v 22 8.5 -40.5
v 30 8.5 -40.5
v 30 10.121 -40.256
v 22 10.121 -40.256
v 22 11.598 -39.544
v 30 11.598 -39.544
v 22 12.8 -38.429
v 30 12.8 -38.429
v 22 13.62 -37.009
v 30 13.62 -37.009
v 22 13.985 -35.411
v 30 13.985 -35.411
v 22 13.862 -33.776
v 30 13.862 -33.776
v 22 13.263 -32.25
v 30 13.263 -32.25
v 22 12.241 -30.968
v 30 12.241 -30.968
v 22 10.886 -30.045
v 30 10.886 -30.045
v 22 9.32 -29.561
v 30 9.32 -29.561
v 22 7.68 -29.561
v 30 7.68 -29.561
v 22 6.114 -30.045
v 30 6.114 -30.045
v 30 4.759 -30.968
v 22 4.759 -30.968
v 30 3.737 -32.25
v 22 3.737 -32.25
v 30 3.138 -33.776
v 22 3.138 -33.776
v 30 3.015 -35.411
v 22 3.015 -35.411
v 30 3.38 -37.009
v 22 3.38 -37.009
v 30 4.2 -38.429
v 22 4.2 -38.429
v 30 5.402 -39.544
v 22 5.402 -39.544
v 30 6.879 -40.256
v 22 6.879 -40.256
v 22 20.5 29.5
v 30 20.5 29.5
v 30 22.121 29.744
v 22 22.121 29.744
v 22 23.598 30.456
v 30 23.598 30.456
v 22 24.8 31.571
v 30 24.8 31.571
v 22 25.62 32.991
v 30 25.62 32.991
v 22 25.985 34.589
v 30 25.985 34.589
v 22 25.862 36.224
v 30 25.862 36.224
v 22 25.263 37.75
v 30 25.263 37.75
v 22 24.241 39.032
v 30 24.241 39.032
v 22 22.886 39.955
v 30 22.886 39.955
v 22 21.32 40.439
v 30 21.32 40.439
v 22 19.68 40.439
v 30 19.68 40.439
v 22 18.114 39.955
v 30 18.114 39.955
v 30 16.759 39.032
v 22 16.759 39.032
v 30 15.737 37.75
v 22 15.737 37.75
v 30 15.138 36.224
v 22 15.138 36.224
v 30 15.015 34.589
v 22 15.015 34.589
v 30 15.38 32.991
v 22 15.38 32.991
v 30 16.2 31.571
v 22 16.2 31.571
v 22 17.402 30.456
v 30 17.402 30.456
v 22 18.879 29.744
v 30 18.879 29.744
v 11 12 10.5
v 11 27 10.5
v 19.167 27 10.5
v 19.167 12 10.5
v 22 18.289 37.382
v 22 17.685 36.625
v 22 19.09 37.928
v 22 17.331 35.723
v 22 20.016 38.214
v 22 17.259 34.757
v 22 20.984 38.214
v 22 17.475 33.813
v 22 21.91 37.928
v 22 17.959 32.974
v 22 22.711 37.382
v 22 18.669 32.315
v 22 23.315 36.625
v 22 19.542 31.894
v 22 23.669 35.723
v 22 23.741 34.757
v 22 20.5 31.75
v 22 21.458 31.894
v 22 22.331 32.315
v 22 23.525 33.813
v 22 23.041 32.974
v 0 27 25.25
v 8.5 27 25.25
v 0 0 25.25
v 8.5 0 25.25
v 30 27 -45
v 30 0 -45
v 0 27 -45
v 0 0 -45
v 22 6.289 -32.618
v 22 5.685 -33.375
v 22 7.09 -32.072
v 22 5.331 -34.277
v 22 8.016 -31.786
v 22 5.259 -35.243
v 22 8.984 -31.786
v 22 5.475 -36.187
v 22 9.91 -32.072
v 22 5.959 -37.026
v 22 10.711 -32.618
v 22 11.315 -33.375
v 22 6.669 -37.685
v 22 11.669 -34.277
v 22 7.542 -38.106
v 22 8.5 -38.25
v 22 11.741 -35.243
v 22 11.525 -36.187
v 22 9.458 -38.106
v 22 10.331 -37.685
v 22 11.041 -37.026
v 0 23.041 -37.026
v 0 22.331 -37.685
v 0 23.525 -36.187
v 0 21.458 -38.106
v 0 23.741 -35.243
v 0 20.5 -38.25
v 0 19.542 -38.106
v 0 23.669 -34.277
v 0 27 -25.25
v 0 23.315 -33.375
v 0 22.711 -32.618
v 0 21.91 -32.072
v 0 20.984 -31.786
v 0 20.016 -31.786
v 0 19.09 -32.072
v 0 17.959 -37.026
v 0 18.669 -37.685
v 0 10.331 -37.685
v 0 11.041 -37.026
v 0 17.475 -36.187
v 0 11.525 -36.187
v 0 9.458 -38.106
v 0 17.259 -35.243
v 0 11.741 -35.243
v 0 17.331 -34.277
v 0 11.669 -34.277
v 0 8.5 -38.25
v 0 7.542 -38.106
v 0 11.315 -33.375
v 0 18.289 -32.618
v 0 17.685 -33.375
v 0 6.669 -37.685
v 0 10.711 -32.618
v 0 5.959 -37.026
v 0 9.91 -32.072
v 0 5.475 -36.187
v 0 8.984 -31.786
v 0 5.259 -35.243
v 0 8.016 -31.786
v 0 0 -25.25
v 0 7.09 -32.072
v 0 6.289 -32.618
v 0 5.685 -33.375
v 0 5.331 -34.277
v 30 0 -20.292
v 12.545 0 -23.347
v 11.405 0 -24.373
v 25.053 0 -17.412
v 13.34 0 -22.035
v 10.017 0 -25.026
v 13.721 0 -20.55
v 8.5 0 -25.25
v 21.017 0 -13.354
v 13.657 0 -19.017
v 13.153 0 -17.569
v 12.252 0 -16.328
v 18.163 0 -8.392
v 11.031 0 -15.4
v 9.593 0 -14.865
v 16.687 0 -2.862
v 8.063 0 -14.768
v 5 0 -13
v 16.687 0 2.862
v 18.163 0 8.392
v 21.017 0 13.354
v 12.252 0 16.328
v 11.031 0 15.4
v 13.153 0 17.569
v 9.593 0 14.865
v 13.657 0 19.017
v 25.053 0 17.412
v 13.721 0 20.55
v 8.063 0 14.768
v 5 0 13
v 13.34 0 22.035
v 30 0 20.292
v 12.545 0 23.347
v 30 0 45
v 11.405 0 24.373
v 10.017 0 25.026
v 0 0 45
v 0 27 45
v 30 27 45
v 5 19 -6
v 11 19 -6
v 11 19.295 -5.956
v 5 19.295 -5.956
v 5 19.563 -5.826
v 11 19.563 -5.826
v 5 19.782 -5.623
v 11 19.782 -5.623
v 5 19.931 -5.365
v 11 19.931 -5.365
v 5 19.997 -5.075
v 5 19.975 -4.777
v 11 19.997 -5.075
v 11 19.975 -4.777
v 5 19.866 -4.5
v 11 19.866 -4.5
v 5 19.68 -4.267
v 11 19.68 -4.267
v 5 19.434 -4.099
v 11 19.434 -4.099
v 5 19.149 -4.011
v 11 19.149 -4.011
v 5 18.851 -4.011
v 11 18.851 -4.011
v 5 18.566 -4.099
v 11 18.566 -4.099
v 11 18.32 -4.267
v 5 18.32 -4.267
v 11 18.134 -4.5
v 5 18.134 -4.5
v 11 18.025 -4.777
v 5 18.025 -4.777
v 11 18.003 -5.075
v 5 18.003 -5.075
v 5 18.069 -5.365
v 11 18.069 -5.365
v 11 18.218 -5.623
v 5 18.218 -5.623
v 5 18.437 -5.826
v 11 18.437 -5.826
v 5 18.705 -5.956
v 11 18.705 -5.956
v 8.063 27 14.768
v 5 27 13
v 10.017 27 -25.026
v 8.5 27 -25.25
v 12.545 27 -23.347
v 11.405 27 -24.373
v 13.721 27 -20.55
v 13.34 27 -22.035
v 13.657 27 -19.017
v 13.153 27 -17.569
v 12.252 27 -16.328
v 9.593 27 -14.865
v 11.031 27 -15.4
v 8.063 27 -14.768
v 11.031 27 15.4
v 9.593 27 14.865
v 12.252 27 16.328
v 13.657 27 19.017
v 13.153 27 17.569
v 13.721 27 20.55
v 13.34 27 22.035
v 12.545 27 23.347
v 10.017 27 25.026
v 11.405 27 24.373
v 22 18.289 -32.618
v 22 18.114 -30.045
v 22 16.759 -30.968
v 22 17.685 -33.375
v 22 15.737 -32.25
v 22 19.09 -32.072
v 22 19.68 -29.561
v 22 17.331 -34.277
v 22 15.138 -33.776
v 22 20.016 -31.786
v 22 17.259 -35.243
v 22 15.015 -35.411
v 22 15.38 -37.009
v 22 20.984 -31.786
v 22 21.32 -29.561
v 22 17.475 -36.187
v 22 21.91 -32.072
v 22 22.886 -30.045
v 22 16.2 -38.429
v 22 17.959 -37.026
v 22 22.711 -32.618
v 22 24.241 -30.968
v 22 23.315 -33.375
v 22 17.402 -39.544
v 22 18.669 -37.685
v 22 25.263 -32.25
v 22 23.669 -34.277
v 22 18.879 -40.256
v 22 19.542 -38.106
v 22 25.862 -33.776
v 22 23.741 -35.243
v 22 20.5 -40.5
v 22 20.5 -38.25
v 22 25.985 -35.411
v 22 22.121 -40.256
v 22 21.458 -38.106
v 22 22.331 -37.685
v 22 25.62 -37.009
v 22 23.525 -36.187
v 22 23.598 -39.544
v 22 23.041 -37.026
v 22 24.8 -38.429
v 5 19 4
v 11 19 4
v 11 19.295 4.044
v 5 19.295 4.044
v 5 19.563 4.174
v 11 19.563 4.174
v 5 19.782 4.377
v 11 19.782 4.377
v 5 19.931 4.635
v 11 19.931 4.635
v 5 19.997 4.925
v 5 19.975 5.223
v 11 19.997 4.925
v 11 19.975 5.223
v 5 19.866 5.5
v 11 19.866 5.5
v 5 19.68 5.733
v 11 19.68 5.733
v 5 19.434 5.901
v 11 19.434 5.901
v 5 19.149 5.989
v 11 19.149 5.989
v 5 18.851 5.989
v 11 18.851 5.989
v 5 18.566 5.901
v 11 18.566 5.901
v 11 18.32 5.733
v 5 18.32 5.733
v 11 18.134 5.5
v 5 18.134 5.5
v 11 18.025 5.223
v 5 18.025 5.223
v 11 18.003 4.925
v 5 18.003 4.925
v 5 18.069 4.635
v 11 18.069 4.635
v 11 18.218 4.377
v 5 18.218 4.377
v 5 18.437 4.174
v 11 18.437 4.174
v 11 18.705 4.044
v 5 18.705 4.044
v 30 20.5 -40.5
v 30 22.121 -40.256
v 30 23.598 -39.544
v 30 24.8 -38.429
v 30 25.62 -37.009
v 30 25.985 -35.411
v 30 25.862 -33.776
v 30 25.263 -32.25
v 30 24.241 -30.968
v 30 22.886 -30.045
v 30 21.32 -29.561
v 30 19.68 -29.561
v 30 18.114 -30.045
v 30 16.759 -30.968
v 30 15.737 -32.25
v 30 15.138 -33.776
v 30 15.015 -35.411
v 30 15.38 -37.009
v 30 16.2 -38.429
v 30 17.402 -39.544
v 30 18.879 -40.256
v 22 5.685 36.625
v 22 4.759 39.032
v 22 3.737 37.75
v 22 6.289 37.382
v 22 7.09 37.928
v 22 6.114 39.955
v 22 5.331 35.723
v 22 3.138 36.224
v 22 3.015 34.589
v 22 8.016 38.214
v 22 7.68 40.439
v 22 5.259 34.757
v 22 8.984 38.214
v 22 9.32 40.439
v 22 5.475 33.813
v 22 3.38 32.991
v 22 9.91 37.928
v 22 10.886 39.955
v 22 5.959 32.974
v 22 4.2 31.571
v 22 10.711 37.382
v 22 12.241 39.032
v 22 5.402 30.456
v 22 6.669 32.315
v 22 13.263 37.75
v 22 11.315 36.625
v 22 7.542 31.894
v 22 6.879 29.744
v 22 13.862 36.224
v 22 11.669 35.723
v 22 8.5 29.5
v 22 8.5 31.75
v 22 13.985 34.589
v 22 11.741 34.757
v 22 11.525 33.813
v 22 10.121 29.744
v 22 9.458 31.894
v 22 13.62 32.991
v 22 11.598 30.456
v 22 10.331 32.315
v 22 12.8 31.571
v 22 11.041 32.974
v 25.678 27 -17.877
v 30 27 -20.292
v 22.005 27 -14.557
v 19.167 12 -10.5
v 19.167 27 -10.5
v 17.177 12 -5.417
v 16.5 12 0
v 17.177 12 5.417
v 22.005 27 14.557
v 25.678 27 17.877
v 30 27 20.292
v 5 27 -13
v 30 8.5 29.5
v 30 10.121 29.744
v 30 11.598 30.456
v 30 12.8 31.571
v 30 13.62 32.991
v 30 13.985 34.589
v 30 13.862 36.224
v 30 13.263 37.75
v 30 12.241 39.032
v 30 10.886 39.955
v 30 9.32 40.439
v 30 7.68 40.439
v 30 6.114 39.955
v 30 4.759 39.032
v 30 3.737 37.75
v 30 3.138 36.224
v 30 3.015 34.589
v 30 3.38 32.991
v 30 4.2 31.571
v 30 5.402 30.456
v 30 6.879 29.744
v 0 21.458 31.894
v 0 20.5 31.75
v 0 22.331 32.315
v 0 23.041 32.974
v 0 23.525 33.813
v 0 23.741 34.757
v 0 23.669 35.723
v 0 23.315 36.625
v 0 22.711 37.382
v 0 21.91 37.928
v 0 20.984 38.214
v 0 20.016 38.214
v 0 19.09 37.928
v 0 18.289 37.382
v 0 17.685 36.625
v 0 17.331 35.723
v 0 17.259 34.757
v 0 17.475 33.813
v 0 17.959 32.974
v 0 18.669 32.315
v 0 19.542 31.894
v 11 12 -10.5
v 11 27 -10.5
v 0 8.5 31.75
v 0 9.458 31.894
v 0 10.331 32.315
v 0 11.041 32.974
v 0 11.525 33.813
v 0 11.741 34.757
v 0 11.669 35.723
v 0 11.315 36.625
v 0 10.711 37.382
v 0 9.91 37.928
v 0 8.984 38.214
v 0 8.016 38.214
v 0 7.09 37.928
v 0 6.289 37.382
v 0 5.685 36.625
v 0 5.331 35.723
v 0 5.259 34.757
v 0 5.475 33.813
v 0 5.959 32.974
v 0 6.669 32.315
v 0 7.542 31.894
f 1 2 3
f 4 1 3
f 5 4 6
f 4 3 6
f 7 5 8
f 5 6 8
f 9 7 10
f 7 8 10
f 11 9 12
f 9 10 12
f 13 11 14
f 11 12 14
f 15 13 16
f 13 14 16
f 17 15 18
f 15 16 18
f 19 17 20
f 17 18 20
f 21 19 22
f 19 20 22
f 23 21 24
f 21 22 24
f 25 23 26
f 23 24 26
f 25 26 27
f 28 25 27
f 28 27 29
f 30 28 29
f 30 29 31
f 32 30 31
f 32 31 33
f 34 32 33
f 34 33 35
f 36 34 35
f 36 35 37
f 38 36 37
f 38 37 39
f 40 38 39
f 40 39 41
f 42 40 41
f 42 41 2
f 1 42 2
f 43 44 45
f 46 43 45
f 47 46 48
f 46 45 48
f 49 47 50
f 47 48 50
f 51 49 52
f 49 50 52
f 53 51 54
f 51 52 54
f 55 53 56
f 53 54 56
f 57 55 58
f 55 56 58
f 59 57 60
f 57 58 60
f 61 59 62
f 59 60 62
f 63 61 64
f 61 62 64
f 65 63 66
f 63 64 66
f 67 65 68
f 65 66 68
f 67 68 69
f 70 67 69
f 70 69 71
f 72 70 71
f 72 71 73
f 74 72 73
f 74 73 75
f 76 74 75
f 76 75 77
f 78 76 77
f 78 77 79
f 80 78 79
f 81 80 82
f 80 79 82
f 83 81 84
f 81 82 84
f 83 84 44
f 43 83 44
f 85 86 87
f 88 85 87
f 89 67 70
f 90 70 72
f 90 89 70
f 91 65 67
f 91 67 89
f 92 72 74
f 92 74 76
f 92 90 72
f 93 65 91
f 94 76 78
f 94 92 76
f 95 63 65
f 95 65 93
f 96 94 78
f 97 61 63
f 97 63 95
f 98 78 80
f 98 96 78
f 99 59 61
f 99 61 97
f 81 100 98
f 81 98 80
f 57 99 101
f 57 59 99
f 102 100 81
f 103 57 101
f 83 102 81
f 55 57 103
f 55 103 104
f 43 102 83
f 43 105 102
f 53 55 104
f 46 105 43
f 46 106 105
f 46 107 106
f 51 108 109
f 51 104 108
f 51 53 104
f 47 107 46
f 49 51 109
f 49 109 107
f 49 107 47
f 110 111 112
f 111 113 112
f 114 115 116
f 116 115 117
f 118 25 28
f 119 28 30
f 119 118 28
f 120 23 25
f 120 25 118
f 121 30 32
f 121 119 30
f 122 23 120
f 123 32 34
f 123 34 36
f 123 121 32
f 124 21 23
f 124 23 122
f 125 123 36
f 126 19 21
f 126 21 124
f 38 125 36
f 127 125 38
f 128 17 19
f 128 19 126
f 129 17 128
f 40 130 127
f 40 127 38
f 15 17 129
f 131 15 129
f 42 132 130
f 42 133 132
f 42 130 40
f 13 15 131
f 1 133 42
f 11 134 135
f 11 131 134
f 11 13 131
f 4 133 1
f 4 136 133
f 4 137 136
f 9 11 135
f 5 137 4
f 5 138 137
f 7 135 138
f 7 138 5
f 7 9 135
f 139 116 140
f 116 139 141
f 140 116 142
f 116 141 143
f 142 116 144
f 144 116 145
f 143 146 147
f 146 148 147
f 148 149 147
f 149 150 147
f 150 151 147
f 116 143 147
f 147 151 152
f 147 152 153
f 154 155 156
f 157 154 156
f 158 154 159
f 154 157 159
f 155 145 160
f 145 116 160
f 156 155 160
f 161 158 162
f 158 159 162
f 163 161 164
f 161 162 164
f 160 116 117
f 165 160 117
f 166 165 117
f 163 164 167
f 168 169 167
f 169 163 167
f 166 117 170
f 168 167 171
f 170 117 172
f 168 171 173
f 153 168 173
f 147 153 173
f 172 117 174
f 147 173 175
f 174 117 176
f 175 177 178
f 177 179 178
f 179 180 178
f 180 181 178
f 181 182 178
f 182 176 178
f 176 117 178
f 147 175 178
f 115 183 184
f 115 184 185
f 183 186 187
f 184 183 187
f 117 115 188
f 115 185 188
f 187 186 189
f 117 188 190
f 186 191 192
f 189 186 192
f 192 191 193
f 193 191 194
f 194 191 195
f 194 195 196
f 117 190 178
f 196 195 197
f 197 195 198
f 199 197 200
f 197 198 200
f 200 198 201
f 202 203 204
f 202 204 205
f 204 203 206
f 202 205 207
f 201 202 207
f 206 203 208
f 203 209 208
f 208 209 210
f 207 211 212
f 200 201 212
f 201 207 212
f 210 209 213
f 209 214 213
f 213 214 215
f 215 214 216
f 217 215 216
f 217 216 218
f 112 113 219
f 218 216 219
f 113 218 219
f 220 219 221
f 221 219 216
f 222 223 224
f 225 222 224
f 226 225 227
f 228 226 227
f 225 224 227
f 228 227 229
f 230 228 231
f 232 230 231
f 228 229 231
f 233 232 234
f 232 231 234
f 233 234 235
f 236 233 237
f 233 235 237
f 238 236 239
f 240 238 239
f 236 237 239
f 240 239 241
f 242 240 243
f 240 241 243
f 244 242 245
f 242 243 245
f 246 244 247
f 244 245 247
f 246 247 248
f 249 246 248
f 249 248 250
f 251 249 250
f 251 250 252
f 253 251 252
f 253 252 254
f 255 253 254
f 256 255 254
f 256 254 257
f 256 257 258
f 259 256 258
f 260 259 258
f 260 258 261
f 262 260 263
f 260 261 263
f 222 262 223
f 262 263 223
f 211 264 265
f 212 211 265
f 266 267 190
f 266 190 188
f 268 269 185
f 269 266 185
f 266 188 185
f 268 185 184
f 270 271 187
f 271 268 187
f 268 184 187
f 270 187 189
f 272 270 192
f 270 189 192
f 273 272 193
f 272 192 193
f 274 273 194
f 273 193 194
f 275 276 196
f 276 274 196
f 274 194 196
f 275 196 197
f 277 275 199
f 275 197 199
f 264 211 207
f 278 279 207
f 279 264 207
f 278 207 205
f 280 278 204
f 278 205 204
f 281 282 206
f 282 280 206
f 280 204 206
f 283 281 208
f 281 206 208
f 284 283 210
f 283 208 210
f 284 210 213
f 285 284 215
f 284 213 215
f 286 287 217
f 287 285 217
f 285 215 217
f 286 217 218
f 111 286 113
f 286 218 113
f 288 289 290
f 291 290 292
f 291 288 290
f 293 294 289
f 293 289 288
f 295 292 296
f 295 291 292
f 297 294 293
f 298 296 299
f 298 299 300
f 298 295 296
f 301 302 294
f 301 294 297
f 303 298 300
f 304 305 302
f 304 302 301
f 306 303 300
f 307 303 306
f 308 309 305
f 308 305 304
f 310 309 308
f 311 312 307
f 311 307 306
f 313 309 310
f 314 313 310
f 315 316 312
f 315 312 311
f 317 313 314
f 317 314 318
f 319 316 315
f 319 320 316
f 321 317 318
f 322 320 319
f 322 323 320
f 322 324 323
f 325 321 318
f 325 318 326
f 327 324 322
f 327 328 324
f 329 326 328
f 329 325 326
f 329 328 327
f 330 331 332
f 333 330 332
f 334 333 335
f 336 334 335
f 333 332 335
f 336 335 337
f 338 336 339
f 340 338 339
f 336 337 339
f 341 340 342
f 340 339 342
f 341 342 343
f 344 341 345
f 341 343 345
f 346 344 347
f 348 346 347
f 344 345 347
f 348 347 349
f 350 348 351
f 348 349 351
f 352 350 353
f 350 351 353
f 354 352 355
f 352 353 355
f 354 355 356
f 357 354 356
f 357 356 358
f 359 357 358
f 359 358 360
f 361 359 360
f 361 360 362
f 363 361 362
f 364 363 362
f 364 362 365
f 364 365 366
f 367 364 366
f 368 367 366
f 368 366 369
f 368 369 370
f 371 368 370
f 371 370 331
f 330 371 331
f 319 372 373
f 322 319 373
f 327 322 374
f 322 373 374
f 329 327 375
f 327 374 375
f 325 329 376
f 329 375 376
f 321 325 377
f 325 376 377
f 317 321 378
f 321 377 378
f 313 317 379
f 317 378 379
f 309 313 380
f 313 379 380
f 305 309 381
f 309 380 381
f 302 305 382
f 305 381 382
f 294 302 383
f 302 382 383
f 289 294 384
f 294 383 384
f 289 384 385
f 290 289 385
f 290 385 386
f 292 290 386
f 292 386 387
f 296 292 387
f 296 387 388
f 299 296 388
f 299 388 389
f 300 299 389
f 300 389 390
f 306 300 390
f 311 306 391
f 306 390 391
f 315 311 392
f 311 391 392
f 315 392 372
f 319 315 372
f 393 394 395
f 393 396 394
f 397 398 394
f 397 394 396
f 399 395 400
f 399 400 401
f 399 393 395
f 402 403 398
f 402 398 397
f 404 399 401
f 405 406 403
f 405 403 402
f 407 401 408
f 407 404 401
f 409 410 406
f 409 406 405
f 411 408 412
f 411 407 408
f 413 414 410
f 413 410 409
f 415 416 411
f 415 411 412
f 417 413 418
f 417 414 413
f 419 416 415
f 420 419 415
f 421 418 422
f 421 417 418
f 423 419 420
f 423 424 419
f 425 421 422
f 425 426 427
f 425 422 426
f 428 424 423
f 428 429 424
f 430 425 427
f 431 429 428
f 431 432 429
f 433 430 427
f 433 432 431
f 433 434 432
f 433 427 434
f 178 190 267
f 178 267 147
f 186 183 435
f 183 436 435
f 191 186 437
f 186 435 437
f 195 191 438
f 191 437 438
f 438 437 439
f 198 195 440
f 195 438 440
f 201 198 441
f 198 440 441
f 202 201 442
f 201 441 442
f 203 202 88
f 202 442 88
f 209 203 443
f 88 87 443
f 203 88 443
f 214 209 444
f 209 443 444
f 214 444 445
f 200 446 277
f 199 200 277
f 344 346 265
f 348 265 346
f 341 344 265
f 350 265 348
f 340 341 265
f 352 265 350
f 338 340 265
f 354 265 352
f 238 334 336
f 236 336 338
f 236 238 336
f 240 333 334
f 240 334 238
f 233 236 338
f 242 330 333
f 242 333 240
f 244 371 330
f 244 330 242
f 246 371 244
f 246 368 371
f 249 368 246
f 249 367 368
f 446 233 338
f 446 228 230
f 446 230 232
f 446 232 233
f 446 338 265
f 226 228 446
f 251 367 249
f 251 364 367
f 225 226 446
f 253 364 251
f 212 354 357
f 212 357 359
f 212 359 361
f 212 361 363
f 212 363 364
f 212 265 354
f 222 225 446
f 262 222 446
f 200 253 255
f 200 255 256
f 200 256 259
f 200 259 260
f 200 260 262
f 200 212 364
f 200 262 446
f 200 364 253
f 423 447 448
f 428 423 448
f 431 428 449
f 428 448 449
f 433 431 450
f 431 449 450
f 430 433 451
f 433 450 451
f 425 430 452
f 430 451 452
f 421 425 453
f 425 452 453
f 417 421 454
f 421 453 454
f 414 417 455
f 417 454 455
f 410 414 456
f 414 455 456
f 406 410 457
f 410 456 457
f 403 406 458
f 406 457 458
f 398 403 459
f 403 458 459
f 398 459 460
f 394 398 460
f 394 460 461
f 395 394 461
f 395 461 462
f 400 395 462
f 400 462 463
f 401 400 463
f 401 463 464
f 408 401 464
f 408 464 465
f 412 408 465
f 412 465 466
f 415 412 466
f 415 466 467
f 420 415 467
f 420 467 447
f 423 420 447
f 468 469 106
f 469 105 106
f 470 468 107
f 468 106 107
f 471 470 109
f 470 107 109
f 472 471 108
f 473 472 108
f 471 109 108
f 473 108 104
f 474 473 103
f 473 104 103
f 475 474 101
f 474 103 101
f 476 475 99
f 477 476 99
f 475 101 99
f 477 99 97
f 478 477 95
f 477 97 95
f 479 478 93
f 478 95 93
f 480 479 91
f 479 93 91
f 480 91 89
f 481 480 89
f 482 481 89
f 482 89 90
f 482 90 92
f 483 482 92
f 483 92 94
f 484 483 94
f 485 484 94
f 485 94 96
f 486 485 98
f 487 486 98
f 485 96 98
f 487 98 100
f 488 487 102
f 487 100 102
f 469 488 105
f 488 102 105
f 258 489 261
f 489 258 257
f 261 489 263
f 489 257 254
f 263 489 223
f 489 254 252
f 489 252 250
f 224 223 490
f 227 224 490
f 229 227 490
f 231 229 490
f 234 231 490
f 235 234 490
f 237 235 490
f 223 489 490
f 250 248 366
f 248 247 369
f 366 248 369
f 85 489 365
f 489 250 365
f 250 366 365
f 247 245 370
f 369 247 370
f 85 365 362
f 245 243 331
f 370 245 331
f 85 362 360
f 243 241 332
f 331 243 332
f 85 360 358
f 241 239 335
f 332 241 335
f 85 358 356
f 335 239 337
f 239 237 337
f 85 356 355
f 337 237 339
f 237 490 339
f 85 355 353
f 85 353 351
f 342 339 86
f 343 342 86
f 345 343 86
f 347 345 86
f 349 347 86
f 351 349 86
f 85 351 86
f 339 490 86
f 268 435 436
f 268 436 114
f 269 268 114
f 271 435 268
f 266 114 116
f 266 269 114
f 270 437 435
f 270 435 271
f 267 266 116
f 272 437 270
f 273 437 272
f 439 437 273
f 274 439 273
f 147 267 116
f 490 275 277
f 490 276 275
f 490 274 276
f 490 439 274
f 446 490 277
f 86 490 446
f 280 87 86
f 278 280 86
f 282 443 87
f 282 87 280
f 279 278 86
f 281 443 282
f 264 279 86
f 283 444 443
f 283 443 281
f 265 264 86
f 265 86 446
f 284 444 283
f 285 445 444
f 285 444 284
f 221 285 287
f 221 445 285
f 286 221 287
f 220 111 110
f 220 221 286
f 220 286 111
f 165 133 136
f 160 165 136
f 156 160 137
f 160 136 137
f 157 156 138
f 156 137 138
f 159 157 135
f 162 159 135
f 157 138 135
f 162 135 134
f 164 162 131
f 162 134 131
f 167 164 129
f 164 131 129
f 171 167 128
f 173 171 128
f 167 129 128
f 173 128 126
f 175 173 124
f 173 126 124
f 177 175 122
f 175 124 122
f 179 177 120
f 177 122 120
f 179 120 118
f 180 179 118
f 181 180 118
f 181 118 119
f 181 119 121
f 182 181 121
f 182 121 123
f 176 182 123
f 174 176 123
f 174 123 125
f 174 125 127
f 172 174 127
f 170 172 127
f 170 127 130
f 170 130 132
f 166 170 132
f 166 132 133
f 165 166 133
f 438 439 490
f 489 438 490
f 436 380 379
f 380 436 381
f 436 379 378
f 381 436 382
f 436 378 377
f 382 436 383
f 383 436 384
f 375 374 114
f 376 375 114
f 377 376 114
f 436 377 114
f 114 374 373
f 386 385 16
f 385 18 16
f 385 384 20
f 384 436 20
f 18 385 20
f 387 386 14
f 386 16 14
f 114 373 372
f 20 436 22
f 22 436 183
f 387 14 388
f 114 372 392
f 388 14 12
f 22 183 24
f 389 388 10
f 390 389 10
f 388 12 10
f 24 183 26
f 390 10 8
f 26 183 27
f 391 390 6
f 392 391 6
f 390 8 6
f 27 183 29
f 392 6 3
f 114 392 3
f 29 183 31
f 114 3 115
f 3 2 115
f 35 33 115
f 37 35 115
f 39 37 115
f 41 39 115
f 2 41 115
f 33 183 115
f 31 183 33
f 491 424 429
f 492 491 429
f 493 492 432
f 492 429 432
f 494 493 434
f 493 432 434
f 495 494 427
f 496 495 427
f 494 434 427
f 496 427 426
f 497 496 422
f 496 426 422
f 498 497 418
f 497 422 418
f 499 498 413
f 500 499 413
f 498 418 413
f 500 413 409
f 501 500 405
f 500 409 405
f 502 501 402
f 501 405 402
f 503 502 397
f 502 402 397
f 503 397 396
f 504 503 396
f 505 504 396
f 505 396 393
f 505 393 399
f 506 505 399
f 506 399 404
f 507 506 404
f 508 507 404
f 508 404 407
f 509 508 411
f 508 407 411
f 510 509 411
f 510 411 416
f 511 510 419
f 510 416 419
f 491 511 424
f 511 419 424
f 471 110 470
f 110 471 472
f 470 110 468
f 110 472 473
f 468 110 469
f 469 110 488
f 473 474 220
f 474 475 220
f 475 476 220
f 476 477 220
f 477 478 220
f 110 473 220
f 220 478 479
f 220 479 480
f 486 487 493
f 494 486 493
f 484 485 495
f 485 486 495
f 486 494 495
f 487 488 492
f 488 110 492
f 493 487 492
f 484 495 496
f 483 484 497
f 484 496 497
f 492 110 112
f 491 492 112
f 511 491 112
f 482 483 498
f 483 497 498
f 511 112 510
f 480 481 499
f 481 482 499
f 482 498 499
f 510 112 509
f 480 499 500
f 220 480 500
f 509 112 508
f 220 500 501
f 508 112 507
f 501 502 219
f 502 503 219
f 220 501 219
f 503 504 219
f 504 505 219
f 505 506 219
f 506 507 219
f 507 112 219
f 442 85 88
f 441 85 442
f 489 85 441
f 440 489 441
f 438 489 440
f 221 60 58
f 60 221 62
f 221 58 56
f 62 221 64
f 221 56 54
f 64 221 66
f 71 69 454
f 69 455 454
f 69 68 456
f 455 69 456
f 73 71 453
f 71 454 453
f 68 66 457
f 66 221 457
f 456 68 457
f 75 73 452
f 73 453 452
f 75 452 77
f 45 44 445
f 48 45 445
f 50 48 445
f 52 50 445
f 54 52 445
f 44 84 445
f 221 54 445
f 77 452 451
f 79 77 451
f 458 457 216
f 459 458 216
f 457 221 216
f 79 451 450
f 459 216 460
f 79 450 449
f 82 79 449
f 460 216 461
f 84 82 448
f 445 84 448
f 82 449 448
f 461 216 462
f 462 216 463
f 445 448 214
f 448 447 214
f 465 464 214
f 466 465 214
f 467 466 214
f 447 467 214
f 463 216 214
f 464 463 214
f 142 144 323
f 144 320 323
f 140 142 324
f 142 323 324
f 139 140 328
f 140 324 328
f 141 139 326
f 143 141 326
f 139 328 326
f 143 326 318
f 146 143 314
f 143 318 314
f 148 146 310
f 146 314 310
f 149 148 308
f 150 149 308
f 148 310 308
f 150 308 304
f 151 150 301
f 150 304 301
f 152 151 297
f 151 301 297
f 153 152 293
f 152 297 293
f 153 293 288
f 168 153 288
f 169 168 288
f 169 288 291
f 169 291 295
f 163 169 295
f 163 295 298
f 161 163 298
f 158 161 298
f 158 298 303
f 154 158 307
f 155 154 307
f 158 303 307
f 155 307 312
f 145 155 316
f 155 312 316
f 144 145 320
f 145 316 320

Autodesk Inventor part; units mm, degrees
ref_plane "YZ Plane" through (0, 0, 0) normal (1, 0, 0) x (0, 1, 0)
ref_plane "XZ Plane" through (0, 0, 0) normal (0, 1, 0) x (-1, 0, 0)
ref_plane "XY Plane" through (0, 0, 0) normal (0, 0, 1) x (1, 0, 0)
sketch "Szkic2" plane through (0, 0, 0) normal (0, 1, 0) x (-1, 0, 0)
  line L0 (-5, 13) -> (-5, -13)
  line L1 (1, -20.25) -> (1, 20.25)
  line L2 (-8.0627, 14.7682) -> (-5, 13)
  line L3 (-5, 16.0869) -> (-5, 13) construction
  arc A0 (-8.0627, 14.7682) -> (-5, 16.0869) centre (-8.5, 20) ccw construction
  line L4 (-3.256, 20.25) -> (-5, 20.25) construction
  arc A1 (-5, 16.0869) -> (-3.256, 20.25) centre (-8.5, 20) ccw construction
  line L5 (1, 20.25) -> (-3.256, 20.25)
  line L6 (-5, 20.25) -> (-5, 16.0869) construction
  line L7 (-5, -13) -> (-8.0627, -14.7682)
  line L8 (-5, -13) -> (-5, -16.0869) construction
  arc A2 (-5, -16.0869) -> (-8.0627, -14.7682) centre (-8.5, -20) ccw construction
  line L9 (-3.256, -20.25) -> (1, -20.25)
  arc A3 (-3.256, -20.25) -> (-5, -16.0869) centre (-8.5, -20) ccw construction
  line L10 (-5, -16.0869) -> (-5, -20.25) construction
  line L11 (-5, -20.25) -> (-3.256, -20.25) construction
  arc A4 (-8.0627, -14.7682) -> (-3.256, -20.25) centre (-8.5, -20) ccw
  arc A5 (-3.256, 20.25) -> (-8.0627, 14.7682) centre (-8.5, 20) ccw
  line L12 (0, 45) -> (-30, 45)
  line L13 (-30, 45) -> (-30, -45)
  line L14 (-30, -45) -> (0, -45)
  line L15 (0, -45) -> (0, 45)
  line L16 (-8.5, 25.25) -> (0, 25.25)
  line L17 (-8.5, -25.25) -> (0, -25.25)
  point P0 (0, 0)
  point P1 (0, -20.25)
  point P2 (0, 20.25)
  dimension "d0" = 10.5
  dimension "d1" = 6
  dimension "d2" = 3.5
  dimension "d3" = 120
  dimension "d4" = 120
  dimension "d5" = 26
  dimension "d6" = 40
  dimension "d8" = 7
  dimension "d9" = 0.25
  dimension "d10" = 0.25
  dimension "d12" = 9.5
  dimension "d14" = 1
  dimension "d15" = 20
  dimension "d16" = 90
  dimension "d17" = 45
  dimension "d18" = 30
extrude "Wyciągnięcie proste1" add sketch "Szkic2" along normal blind 27 contours L0 L7 A4 L17 L15 L14 L13 L12 L16 A5 L2
sketch "Szkic3" plane through (30, 0, 45) normal (1, 0, 0) x (0, 0, -1)
  circle A0 centre (10, 20.5) radius 3.25
  circle A1 centre (10, 8.5) radius 3.25
  circle A2 centre (80, 20.5) radius 3.25
  circle A3 centre (80, 8.5) radius 3.25
  line L0 (0, 0) -> (0, 27) projected
  line L1 (0, 27) -> (90, 27) projected
  line L2 (90, 0) -> (90, 27) projected
  circle A4 centre (10, 20.5) radius 5.5
  circle A5 centre (10, 8.5) radius 5.5
  circle A6 centre (80, 20.5) radius 5.5
  circle A7 centre (80, 8.5) radius 5.5
  point P0 (45, 0)
  dimension "d21" = 6.5
  dimension "d22" = 10
  dimension "d23" = 6.5
  dimension "d24" = 12
  dimension "d25" = 10
  dimension "d26" = 11
extrude "Wyciągnięcie proste2" cut sketch "Szkic3" against normal through all contours A0 | A1 | A2 | A3
extrude "Wyciągnięcie proste3" cut sketch "Szkic3" against normal blind 8 contours A1 | A2 | A3 | A4 | A5 | A6 | A7
sketch "Szkic4" plane through (0, 27, 0) normal (0, 1, 0) x (1, 0, 0)
  line L0 (30, -45) -> (30, 45) projected
  circle A0 centre (38.5, 0) radius 22
  point P0 (0, 0)
  dimension "d34" = 44
  dimension "d37" = 8.5
  dimension "d38" = 38.5
extrude "Wyciągnięcie proste4" cut sketch "Szkic4" against normal through all
sketch "Szkic8" plane through (0, 27, 0) normal (0, 1, 0) x (1, 0, 0)
  line L0 (11, -10.5) -> (21, -10.5)
  line L1 (21, -10.5) -> (21, 10.5)
  line L2 (21, 10.5) -> (11, 10.5)
  line L3 (11, 10.5) -> (11, -10.5)
  line L4 (5, 13) -> (5, -13) projected
  point P0 (0, 0)
  dimension "d58" = 21
  dimension "d59" = 6
  dimension "d60" = 10.5
  dimension "d61" = 10
extrude "Wyciągnięcie proste8" cut sketch "Szkic8" against normal blind 15
sketch "Szkic9" plane through (11, 27, 10.5) normal (1, 0, 0) x (0, 0, -1)
  circle A0 centre (5.5, -8) radius 1
  circle A1 centre (15.5, -8) radius 1
  line L0 (0, 0) -> (21, 0) projected
  line L1 (0, -15) -> (0, 0) projected
  point P0 (10.5, -27)
  dimension "d64" = 2
  dimension "d65" = 10
  dimension "d66" = 8
  dimension "d67" = 5.5
extrude "Wyciągnięcie proste9" cut sketch "Szkic9" against normal through all
equation "\"d25\" = d22"
equation "\"d60\" = 0.5 * d58"
properties part number "YCarriageFrontHolder" material "Tworzywo sztuczne ABS"
